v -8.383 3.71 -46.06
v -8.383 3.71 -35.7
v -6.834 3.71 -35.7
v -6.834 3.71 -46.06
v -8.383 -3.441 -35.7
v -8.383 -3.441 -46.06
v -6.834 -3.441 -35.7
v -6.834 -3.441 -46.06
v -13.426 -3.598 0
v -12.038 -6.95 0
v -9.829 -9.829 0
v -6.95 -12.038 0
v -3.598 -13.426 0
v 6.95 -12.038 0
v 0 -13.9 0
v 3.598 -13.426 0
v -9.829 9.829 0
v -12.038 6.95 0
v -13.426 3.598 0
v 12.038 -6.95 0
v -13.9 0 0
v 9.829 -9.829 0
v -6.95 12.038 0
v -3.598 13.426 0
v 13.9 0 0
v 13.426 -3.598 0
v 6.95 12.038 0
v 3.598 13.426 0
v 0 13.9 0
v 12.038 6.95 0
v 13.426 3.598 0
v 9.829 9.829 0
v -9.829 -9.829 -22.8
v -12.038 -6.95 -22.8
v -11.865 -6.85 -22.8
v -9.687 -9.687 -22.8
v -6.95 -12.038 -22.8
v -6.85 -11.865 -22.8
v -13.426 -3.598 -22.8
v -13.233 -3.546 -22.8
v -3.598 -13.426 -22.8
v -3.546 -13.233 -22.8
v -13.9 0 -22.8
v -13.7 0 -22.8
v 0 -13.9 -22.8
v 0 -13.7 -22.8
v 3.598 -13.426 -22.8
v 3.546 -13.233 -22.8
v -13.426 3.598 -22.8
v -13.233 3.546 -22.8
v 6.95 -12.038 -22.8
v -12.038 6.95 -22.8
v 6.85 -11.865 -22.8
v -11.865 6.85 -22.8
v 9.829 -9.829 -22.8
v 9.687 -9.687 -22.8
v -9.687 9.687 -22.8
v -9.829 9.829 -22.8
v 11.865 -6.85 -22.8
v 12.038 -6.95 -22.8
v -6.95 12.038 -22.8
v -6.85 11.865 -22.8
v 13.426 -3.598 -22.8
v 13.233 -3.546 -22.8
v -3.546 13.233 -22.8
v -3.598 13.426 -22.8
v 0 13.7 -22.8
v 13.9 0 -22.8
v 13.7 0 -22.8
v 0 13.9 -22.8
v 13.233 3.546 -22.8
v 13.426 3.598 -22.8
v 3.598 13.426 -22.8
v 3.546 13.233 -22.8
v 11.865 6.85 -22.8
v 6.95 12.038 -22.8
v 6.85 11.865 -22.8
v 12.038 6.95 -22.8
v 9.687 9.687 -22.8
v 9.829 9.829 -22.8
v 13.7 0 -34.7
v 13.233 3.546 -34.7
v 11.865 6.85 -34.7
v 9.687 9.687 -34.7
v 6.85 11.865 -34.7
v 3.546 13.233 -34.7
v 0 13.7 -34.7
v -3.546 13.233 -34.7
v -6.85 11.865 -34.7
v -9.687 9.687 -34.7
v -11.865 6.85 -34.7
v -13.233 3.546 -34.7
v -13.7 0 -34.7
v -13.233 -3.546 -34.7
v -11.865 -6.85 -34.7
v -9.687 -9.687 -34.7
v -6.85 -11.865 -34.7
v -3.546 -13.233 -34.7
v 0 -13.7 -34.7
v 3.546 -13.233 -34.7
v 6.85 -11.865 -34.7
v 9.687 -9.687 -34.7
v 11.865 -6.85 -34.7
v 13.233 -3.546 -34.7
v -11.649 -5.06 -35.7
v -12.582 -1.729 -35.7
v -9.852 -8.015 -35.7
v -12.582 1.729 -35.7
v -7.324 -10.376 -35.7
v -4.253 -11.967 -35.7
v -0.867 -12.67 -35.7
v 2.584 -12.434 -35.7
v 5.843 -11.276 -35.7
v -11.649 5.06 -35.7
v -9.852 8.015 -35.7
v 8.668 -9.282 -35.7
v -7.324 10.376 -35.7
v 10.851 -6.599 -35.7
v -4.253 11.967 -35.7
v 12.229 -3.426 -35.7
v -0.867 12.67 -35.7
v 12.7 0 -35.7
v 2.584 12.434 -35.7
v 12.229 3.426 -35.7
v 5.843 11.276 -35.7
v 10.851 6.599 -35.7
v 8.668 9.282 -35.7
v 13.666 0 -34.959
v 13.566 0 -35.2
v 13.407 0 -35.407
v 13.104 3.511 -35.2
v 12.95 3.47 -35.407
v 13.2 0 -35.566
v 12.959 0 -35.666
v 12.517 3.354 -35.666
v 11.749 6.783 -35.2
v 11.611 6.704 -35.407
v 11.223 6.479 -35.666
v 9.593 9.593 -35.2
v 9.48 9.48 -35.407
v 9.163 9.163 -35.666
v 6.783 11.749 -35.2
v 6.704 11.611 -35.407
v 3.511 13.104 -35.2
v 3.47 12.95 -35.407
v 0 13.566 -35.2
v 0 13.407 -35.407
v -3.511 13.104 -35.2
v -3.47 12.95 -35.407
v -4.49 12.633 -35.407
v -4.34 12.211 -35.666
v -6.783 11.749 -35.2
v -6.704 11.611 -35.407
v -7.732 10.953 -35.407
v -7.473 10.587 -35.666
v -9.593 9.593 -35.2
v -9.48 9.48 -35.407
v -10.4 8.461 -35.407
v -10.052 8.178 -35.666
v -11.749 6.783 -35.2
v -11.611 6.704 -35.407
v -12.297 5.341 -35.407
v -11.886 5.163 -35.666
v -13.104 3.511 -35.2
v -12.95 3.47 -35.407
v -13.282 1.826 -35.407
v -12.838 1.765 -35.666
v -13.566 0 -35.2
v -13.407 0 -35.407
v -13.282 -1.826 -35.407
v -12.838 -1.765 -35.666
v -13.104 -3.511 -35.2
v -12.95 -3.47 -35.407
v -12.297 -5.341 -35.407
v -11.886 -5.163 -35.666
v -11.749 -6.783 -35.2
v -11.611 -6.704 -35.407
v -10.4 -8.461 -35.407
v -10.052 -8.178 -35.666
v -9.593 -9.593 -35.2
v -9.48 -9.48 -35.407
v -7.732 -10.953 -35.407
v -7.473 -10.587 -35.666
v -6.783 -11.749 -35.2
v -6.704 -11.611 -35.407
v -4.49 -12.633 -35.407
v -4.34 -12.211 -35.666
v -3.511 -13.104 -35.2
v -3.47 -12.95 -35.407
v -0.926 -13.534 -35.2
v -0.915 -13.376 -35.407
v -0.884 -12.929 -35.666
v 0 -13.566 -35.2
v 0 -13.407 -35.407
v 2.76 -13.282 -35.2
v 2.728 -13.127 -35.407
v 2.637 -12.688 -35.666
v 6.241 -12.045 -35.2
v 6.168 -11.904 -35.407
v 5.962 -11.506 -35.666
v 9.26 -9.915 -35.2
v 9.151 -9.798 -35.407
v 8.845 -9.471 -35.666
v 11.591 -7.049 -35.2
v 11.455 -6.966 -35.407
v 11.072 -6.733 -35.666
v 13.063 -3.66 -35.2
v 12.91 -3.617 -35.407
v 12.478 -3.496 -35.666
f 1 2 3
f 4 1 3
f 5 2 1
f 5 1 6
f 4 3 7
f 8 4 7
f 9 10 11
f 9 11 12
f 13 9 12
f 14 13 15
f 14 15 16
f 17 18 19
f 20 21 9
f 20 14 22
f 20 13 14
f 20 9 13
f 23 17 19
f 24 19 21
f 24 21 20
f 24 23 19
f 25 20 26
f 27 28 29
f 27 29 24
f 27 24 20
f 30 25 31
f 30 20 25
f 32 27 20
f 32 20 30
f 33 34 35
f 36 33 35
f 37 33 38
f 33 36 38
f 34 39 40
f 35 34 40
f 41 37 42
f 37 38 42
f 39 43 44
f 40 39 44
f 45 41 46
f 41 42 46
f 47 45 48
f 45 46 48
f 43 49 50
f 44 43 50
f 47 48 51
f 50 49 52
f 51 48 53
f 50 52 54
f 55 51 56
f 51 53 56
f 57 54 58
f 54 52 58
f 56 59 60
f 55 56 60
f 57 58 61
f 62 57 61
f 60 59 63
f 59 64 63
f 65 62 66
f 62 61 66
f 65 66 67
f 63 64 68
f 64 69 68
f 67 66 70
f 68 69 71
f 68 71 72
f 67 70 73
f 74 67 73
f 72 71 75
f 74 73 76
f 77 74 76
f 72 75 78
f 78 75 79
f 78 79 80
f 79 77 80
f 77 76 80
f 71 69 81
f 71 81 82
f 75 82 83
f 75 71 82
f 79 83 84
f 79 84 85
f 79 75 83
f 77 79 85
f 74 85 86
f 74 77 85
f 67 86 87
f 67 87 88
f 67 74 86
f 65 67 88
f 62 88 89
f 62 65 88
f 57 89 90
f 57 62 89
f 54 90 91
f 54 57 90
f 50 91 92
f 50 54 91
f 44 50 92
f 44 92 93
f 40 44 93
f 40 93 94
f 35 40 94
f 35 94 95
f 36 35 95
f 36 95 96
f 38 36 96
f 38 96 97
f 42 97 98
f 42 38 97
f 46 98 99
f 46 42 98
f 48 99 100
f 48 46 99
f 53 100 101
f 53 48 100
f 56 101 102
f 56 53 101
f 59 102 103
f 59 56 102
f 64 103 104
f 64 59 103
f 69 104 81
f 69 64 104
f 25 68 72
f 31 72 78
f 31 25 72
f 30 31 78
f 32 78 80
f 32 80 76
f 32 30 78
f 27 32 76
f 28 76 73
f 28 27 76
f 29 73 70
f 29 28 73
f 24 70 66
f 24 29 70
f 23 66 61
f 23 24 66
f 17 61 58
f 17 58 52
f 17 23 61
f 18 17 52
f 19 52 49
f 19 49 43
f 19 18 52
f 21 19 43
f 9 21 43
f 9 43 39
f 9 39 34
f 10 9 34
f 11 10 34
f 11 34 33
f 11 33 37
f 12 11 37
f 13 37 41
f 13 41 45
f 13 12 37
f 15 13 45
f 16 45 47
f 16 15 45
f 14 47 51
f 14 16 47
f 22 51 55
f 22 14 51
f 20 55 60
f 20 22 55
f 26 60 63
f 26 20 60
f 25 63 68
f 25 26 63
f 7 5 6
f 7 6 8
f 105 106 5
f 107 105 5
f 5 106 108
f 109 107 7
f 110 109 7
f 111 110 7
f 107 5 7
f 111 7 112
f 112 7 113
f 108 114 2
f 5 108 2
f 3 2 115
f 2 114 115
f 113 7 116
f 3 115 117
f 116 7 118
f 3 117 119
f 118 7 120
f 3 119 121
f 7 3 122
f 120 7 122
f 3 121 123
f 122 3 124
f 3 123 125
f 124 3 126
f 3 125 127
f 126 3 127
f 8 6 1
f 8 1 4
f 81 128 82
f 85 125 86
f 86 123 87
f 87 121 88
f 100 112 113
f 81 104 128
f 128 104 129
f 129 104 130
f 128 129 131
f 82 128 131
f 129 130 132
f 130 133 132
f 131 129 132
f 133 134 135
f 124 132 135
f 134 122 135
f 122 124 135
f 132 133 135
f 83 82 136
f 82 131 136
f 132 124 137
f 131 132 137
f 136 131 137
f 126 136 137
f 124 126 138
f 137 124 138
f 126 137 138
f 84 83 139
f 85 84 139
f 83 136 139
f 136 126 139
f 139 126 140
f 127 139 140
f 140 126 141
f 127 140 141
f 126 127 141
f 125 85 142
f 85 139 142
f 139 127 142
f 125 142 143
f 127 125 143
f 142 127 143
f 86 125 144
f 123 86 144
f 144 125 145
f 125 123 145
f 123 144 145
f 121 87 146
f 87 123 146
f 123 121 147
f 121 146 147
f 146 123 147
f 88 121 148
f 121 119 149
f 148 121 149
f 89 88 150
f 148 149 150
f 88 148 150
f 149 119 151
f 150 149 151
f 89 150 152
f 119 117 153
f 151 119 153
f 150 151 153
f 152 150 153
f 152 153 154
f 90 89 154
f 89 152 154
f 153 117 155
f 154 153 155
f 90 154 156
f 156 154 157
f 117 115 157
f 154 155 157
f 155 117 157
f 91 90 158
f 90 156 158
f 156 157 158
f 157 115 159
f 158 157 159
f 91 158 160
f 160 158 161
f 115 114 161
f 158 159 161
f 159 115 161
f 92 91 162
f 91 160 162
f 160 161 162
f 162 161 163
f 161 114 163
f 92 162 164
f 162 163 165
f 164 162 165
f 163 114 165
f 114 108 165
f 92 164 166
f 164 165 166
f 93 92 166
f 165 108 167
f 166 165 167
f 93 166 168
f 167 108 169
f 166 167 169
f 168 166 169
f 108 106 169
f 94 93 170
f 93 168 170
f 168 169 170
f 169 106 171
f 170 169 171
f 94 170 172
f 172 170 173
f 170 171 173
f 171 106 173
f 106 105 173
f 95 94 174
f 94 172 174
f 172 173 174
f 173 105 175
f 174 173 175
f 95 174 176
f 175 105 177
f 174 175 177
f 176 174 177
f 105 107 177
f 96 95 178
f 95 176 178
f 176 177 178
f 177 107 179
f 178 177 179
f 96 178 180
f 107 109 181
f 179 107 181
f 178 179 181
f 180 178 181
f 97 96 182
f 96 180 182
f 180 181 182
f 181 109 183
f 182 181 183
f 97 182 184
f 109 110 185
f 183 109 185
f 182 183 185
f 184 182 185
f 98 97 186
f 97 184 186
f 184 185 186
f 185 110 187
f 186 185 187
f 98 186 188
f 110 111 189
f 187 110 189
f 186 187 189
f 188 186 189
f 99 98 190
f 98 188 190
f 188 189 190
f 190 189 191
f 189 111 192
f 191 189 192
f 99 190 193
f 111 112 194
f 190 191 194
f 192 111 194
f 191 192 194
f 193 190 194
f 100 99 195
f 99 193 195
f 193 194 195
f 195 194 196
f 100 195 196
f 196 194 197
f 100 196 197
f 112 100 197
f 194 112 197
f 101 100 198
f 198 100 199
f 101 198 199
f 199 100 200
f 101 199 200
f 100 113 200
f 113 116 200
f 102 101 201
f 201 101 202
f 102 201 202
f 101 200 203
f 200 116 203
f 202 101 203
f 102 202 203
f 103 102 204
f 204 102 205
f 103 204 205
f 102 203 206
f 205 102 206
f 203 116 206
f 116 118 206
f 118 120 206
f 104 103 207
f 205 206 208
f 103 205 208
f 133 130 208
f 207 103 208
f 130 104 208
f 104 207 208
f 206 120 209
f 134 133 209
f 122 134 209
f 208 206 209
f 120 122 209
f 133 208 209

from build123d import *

# Parameters (mm, degrees)
SKETCH_R     = 13.9
PAD_DEPTH    = 22.8
SKETCH001_R  = 13.7
PAD001_DEPTH = 12.9
FILLET_R     = 1
SKETCH002_W  = 1.549461
SKETCH002_H  = 7.151371
PAD002_DEPTH = 10.36


with BuildPart() as part:
    # Sketch → Pad (new body)
    with BuildSketch(Plane.XY):
        Circle(SKETCH_R)
    extrude(amount=-PAD_DEPTH)

    # Sketch001 → Pad001 (join)
    with BuildSketch(Plane.XY.offset(-22.8)):
        Circle(SKETCH001_R)
    extrude(amount=-PAD001_DEPTH)

    # Fillet
    fillet_edges = [part.edges().sort_by_distance(p)[0] for p in [
        (-13.7, 0, -35.7),
    ]]
    fillet(fillet_edges, radius=FILLET_R)

    # Sketch002 (on Face4 of Fillet) → Pad002 (join)
    with BuildSketch(Plane(origin=(0, 0, -35.7), x_dir=(1, 0, 0), z_dir=(0, 0, -1))):
        with Locations((-7.608272, -0.134424)):
            Rectangle(SKETCH002_W, SKETCH002_H)
    extrude(amount=PAD002_DEPTH)


solid = part.part
